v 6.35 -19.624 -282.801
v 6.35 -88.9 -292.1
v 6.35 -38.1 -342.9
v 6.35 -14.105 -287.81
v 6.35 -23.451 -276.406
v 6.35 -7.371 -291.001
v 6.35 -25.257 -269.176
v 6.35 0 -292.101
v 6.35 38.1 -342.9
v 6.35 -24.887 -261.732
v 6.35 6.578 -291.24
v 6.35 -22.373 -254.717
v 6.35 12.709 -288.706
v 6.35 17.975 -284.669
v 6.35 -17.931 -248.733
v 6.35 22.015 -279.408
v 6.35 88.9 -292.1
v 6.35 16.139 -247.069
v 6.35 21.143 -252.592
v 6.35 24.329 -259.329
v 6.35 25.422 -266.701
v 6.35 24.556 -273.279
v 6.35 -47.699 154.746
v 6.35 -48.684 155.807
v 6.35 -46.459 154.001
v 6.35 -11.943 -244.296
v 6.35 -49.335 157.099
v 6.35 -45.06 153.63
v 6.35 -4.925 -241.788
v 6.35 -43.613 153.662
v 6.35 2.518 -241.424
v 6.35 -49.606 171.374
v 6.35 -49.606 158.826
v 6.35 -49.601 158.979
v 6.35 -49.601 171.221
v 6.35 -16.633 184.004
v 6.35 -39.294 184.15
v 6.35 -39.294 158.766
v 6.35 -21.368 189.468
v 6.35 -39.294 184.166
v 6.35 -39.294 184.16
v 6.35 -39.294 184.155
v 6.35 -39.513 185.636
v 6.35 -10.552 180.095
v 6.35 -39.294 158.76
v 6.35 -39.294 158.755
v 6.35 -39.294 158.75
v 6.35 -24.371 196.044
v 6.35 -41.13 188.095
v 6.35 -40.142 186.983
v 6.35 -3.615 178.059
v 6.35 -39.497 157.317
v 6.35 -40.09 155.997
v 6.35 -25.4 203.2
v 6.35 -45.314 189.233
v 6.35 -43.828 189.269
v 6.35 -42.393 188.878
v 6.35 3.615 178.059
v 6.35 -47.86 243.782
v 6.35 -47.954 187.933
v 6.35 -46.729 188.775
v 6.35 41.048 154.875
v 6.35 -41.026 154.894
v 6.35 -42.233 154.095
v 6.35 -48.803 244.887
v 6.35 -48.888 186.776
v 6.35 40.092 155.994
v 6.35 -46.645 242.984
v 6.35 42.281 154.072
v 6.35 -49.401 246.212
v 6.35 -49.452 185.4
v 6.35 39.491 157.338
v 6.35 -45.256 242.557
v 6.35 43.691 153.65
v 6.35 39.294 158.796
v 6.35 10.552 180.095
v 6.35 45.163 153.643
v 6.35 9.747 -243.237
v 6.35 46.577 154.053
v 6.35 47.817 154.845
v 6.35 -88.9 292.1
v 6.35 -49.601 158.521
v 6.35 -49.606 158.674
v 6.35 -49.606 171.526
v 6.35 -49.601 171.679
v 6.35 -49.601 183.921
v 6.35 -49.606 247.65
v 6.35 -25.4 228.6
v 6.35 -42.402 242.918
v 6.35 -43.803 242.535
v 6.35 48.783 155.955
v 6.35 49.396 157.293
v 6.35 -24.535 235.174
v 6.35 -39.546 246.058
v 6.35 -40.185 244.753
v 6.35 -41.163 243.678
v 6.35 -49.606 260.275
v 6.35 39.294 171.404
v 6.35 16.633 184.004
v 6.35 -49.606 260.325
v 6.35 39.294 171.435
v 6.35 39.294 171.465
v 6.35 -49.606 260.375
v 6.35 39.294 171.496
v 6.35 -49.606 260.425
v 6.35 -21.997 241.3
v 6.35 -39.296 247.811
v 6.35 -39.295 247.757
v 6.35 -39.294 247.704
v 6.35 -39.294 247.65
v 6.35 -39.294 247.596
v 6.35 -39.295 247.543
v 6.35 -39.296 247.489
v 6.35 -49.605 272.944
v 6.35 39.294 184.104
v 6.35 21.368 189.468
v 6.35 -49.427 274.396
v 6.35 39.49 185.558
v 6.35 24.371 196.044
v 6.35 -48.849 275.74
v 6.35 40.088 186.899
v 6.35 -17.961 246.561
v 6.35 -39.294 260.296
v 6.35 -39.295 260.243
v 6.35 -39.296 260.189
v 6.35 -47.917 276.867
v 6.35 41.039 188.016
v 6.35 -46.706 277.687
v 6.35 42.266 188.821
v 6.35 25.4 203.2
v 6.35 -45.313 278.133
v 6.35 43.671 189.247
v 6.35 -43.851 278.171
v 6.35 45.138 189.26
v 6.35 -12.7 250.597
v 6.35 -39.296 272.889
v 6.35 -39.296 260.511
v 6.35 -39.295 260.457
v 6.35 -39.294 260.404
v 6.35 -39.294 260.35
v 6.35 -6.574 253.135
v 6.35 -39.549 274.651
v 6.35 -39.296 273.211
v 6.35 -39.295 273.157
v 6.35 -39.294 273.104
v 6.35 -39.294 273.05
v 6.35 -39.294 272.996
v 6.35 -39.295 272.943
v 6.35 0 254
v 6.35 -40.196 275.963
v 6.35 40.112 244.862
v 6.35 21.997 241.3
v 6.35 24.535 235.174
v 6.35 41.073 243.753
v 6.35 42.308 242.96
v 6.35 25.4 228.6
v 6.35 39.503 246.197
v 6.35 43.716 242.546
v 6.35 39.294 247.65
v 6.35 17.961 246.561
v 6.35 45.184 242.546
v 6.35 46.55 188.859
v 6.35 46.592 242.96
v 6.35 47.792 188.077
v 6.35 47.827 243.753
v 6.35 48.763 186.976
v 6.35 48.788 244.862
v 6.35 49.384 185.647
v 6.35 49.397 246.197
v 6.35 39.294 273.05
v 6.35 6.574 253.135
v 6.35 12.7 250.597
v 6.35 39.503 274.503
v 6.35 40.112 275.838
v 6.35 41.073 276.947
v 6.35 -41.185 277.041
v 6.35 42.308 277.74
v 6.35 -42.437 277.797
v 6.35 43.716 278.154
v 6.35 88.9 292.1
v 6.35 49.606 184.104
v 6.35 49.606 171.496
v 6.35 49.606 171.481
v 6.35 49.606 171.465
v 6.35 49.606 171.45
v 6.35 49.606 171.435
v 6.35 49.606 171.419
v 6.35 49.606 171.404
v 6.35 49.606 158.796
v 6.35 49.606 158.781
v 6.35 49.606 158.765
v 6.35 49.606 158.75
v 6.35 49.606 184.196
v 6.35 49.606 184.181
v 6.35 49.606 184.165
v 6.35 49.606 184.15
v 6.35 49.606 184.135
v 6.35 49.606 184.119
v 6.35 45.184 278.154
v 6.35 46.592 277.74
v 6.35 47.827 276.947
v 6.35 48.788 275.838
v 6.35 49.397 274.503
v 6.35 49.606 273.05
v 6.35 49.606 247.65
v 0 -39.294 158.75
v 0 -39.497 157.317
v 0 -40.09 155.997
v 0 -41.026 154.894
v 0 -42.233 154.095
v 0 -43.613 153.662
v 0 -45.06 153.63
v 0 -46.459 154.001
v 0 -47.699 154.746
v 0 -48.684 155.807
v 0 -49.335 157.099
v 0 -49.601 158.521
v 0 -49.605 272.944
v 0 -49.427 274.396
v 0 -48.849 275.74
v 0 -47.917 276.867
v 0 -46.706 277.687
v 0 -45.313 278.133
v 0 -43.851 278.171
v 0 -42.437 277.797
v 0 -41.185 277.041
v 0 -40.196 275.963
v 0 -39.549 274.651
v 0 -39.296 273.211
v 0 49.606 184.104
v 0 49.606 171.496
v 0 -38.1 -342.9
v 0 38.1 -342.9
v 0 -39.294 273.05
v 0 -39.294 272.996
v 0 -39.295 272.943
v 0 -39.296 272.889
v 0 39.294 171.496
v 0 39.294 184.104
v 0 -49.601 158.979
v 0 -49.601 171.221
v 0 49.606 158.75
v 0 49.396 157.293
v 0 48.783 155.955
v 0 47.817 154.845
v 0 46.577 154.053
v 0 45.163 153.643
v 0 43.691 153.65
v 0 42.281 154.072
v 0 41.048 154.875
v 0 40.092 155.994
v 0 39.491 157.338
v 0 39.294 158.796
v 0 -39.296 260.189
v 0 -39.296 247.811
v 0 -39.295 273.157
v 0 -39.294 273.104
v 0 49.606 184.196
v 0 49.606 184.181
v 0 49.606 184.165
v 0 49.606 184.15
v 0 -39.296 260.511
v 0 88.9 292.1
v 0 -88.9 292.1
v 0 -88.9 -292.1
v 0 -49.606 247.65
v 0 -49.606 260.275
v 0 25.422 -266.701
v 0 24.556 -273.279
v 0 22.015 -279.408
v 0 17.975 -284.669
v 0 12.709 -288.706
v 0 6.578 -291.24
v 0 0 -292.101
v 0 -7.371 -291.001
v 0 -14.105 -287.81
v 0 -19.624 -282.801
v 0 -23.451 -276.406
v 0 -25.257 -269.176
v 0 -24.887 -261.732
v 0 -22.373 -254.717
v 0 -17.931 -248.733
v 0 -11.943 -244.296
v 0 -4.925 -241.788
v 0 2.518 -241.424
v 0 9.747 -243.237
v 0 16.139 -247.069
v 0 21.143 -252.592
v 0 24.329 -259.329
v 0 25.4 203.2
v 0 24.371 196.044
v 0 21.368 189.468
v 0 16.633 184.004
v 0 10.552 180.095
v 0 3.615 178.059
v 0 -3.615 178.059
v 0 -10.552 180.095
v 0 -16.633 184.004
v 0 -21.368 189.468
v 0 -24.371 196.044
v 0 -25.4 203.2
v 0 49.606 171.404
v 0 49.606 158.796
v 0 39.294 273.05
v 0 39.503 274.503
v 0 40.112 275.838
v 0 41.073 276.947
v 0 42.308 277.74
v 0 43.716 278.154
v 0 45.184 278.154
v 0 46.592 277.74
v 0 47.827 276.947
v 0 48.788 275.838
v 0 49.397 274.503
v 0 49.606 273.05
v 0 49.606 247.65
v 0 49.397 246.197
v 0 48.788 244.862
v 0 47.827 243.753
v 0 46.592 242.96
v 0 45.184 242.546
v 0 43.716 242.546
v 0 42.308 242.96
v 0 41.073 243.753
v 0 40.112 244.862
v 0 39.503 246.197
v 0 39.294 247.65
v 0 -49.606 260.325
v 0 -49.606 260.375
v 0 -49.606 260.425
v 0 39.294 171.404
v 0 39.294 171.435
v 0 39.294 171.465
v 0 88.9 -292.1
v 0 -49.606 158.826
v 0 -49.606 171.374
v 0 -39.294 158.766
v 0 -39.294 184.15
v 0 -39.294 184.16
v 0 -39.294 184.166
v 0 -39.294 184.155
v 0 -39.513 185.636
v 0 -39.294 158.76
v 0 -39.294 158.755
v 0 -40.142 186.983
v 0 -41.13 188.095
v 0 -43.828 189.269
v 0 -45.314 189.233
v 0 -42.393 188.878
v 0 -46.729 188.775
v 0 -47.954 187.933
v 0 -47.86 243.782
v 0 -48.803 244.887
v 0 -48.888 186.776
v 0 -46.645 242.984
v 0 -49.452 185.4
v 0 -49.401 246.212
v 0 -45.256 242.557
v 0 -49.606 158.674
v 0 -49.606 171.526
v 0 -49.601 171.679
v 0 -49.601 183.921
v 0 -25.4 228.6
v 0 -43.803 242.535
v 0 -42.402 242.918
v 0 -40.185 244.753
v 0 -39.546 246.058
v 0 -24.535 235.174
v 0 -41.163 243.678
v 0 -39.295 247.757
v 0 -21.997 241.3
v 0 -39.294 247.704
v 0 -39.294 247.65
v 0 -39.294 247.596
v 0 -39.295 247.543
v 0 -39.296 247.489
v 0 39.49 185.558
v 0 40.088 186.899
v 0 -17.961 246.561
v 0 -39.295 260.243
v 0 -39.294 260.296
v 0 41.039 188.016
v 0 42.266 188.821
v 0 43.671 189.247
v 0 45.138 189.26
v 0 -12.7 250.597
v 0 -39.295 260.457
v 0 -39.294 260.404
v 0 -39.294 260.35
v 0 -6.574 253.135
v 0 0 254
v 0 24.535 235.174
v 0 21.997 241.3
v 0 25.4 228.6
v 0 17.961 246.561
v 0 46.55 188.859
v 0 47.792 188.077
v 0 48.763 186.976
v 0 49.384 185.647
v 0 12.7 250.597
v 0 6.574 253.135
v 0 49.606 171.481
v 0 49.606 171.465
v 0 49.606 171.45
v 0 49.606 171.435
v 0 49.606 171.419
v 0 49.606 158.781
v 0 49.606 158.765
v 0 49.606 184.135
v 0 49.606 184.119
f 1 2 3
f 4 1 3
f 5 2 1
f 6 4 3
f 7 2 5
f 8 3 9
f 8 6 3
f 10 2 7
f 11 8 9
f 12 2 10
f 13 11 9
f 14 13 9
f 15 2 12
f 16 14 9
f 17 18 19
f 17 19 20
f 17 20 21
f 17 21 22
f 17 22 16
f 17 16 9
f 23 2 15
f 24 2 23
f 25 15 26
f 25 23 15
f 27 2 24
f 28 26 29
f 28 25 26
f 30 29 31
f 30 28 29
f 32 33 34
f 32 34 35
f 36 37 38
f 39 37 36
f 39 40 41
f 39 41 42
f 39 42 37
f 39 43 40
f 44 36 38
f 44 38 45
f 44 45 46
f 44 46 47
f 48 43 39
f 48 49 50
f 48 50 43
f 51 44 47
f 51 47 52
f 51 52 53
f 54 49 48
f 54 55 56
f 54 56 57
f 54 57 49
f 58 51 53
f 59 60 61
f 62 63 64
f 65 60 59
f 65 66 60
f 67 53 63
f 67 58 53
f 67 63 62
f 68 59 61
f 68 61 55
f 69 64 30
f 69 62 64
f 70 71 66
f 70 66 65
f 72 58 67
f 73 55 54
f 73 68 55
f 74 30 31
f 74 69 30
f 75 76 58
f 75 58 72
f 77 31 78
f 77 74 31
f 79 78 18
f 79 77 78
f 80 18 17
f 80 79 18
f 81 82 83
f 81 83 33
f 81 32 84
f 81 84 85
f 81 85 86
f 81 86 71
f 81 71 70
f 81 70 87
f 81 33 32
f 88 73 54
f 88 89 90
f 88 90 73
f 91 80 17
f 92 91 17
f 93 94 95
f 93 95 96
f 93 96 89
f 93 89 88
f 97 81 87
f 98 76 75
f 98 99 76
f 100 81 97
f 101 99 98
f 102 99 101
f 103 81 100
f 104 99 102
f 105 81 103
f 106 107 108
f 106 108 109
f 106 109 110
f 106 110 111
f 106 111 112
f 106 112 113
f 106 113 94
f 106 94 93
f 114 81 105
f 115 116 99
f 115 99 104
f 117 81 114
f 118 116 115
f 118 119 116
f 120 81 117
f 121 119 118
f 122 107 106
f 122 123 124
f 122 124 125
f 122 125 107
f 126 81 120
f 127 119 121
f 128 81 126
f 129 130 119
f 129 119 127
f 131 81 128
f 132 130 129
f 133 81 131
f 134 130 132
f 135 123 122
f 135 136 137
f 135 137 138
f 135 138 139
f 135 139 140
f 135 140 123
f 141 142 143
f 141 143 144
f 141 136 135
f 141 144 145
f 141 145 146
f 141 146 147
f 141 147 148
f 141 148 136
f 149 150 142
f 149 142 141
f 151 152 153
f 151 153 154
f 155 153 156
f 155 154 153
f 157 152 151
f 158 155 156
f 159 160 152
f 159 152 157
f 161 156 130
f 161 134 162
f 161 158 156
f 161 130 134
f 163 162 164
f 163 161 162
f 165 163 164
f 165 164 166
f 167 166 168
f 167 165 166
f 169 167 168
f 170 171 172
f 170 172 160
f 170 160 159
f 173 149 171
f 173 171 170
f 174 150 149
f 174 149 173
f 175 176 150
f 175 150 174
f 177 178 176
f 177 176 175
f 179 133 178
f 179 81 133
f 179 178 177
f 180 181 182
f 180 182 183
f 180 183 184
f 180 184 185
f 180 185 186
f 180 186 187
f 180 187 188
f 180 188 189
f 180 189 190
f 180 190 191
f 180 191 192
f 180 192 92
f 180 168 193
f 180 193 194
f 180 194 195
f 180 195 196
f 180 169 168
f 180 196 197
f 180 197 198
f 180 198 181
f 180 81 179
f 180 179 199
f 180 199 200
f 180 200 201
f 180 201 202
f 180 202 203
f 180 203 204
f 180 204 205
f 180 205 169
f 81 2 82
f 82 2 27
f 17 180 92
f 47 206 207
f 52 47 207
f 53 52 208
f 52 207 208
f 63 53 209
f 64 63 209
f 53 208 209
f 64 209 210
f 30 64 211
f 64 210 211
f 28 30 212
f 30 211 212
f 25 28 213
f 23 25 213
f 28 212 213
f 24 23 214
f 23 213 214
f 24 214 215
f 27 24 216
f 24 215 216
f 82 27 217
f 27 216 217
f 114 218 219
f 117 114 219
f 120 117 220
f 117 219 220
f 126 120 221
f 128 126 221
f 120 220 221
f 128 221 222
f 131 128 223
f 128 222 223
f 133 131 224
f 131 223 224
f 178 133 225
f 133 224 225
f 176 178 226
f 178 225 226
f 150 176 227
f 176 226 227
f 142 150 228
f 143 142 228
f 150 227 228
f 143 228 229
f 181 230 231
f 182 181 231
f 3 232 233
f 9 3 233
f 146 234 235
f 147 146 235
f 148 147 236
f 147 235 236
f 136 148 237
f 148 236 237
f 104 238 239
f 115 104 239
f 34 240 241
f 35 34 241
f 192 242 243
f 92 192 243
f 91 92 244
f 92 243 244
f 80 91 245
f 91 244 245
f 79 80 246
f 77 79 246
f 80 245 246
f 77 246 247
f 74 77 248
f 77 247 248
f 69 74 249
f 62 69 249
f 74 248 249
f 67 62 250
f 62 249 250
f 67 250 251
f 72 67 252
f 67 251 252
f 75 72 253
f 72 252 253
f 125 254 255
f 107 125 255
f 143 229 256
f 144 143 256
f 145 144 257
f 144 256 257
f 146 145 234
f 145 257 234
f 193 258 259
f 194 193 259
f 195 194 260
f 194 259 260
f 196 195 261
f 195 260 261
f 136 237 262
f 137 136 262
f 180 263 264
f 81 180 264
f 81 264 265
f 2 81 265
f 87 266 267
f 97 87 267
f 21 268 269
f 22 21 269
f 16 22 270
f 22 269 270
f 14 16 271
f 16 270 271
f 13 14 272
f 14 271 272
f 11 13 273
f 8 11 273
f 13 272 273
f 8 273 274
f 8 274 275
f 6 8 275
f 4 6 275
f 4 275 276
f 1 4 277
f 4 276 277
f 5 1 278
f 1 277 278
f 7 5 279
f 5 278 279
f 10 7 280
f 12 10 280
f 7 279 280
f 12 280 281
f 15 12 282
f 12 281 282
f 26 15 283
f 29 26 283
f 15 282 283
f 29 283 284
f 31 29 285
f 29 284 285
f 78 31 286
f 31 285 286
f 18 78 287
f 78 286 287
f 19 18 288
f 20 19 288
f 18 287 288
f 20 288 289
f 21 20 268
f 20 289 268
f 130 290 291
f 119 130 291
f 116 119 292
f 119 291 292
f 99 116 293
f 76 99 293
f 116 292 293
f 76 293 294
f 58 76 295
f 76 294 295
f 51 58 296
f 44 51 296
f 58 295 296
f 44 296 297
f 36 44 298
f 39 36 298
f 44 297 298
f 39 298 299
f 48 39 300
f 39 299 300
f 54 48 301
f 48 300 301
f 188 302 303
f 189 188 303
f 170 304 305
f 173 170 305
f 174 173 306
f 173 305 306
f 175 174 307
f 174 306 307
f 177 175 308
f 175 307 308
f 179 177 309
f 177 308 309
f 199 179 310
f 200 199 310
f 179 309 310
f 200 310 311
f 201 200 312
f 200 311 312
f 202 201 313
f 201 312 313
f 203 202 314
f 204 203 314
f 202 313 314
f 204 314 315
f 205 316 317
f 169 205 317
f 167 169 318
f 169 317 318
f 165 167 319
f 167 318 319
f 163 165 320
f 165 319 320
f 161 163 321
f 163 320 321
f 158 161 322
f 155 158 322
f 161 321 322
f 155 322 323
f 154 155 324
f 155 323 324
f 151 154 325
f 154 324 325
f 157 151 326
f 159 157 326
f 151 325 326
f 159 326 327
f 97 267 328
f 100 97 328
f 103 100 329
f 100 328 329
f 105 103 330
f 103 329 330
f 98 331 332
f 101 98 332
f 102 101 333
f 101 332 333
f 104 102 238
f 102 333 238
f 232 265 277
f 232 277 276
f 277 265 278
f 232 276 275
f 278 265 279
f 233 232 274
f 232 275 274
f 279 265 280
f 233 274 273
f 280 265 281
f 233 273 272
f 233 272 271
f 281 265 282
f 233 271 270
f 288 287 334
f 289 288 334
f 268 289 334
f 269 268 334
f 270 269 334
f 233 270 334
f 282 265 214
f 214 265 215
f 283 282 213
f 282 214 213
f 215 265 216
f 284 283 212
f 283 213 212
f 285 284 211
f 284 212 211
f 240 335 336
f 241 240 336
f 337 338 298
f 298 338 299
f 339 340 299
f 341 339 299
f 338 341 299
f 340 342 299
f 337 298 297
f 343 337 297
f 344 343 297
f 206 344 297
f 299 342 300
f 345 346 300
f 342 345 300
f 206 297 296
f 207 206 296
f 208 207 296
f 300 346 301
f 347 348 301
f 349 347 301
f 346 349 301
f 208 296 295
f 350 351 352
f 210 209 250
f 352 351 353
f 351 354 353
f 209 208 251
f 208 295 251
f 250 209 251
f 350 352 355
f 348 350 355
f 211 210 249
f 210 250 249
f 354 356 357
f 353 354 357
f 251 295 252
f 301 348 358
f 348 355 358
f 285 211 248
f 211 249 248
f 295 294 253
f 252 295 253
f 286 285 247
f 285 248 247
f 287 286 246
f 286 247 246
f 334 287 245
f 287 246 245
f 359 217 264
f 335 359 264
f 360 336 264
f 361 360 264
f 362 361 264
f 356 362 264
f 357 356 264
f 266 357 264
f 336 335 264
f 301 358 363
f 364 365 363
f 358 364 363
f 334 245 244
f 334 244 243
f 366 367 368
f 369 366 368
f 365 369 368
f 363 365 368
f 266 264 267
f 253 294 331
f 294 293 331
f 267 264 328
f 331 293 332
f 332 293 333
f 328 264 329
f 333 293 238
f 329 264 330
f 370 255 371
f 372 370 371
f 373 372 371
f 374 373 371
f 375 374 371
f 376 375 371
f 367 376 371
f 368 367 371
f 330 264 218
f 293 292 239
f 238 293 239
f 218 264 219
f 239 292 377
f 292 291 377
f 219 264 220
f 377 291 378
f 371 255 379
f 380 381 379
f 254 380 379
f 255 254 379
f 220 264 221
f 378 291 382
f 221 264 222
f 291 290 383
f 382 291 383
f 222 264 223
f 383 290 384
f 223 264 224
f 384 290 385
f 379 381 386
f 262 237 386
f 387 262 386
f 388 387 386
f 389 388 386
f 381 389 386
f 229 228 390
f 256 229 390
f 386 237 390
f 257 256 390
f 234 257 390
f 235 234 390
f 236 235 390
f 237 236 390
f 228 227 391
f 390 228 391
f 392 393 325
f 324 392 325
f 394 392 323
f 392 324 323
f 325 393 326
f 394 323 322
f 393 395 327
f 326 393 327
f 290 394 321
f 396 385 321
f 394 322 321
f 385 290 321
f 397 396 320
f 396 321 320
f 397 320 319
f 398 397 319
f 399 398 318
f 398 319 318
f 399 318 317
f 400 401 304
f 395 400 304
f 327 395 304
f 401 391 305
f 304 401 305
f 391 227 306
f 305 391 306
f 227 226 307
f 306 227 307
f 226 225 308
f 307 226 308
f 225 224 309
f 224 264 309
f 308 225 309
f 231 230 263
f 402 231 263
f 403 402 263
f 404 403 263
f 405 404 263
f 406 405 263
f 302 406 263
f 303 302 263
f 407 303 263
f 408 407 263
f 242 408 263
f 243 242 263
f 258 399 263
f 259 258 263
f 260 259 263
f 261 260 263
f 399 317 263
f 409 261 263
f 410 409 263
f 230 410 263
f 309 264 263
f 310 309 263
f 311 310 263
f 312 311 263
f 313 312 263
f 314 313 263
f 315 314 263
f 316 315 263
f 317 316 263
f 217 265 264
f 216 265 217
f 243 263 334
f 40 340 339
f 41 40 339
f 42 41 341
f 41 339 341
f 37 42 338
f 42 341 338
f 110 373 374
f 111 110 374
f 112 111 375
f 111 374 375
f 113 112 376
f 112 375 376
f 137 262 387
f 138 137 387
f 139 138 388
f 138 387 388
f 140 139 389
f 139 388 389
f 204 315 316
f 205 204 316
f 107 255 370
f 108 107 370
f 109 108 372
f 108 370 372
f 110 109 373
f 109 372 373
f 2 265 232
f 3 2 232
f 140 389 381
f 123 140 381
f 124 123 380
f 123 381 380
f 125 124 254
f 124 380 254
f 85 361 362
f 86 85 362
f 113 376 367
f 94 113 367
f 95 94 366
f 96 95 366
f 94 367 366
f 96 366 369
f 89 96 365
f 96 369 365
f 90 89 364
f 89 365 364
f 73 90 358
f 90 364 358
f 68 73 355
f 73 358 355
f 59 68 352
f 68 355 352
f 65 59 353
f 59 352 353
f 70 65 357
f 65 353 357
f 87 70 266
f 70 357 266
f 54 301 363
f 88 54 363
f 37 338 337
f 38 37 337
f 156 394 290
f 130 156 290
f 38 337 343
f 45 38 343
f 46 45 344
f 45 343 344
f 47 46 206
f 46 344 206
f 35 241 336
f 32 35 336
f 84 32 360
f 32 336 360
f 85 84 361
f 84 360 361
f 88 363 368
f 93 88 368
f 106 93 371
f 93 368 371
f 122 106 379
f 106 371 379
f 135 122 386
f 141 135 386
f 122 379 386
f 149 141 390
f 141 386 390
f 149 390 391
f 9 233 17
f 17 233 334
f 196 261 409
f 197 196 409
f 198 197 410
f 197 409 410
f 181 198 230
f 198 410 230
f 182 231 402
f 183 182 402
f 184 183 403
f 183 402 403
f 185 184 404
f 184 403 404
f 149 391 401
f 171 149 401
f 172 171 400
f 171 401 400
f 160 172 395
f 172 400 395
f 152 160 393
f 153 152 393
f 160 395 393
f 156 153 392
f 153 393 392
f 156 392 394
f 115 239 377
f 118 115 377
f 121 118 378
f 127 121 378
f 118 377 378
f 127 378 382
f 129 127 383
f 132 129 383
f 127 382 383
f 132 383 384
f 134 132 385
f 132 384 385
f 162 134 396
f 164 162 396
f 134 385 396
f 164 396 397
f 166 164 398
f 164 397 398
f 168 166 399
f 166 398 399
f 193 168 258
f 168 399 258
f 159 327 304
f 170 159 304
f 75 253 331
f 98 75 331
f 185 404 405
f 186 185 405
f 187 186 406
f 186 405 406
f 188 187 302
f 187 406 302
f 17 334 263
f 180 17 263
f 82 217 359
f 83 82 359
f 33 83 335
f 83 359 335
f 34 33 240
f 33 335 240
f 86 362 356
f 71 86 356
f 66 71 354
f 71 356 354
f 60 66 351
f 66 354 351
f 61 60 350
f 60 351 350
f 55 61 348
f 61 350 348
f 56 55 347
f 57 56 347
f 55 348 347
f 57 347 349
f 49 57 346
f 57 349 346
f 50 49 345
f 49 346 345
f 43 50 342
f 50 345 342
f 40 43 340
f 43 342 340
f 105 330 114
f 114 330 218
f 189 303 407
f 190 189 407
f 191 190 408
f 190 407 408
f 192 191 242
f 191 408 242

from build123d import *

# Parameters (mm, degrees)
F1_DEPTH = 6.35


# Not quite as in the source:
# - ends of sketch curves that miss each other by under 0.0002 mm in the source are joined


with BuildPart() as f1:
    # F0 (on Right) → F1 (new body)
    with BuildSketch(Plane.YZ):
        Polygon((0, 292.1), (-88.9, 292.1), (-88.9, -292.1), (-38.1, -342.9), (0, -342.9), (38.1, -342.9), (88.9, -292.1), (88.9, 292.1), align=None)
        with BuildLine():
            ThreePointArc((25.4220090151, -266.7011916637), (17.974738209, -284.6694835829), (0, -292.1011821284))
            ThreePointArc((0, -292.1011821284), (-17.9307201788, -248.7328997446), (25.4220090151, -266.7011916637))
        make_face(mode=Mode.SUBTRACT)
        with BuildLine():
            Line((-39.2938236907, 184.15), (-39.2938236907, 171.45))
            Line((-39.2938236907, 171.45), (-39.2938236907, 158.7656303343))
            ThreePointArc((-39.2938236907, 158.7656303343), (-39.2938059227, 158.7578151761), (-39.2938, 158.75))
            ThreePointArc((-39.2938, 158.75), (-44.3355371946, 153.59507064), (-49.6011180661, 158.5211308033))
            ThreePointArc((-49.6011180661, 158.5211308033), (-49.6062, 158.75), (-49.6011180661, 158.9788691967))
            Line((-49.6011180661, 158.9788691967), (-49.6011180661, 171.2211308033))
            ThreePointArc((-49.6011180661, 171.2211308033), (-49.6062, 171.45), (-49.6011180661, 171.6788691967))
            Line((-49.6011180661, 171.6788691967), (-49.6011180661, 183.9211308033))
            ThreePointArc((-49.6011180661, 183.9211308033), (-44.5722759242, 189.3047499492), (-39.2938236907, 184.1656303343))
            ThreePointArc((-39.2938236907, 184.1656303343), (-39.2938059227, 184.1578151761), (-39.2938236907, 184.15))
        make_face(mode=Mode.SUBTRACT)
        with BuildLine():
            ThreePointArc((-39.2963037105, 260.5106642339), (-39.2944259656, 260.4303418705), (-39.2938, 260.35))
            ThreePointArc((-39.2938, 260.35), (-39.2944259656, 260.2696581295), (-39.2963037105, 260.1893357661))
            Line((-39.2963037105, 260.1893357661), (-39.2963037105, 247.8106642339))
            ThreePointArc((-39.2963037105, 247.8106642339), (-39.2944259656, 247.7303418705), (-39.2938, 247.65))
            ThreePointArc((-39.2938, 247.65), (-39.2944259656, 247.5696581295), (-39.2963037105, 247.4893357661))
            ThreePointArc((-39.2963037105, 247.4893357661), (-44.5304520833, 242.4944276843), (-49.6061999953, 247.6502204525))
            Line((-49.6061999953, 247.6502204525), (-49.6056602081, 260.2753926376))
            ThreePointArc((-49.6056602081, 260.2753926376), (-49.6061999953, 260.3502204525), (-49.6056538096, 260.4250482209))
            Line((-49.6056538096, 260.4250482209), (-49.6051185467, 272.9444007144))
            ThreePointArc((-49.6051185467, 272.9444007144), (-44.583133659, 278.2044809505), (-39.2963037105, 273.2106642339))
            ThreePointArc((-39.2963037105, 273.2106642339), (-39.2944259656, 273.1303418705), (-39.2938, 273.05))
            ThreePointArc((-39.2938, 273.05), (-39.2944259656, 272.9696581295), (-39.2963037105, 272.8893357661))
            Line((-39.2963037105, 272.8893357661), (-39.2963037105, 260.5106642339))
        make_face(mode=Mode.SUBTRACT)
        with BuildLine():
            ThreePointArc((-25.4, 228.6), (-17.9605122421, 246.5605122421), (0, 254))
            ThreePointArc((0, 254), (17.9605122421, 246.5605122421), (25.4, 228.6))
            Line((25.4, 228.6), (25.4, 203.2))
            ThreePointArc((25.4, 203.2), (0, 177.8), (-25.4, 203.2))
            Line((-25.4, 203.2), (-25.4, 228.6))
        make_face(mode=Mode.SUBTRACT)
        with BuildLine():
            ThreePointArc((49.6059938769, 171.496104026), (49.606148469, 171.4730522434), (49.6062, 171.45))
            ThreePointArc((49.6062, 171.45), (49.606148469, 171.4269477566), (49.6059938769, 171.403895974))
            Line((49.6059938769, 171.403895974), (49.6059938769, 158.796104026))
            ThreePointArc((49.6059938769, 158.796104026), (49.606148469, 158.7730522434), (49.6062, 158.75))
            ThreePointArc((49.6062, 158.75), (44.4268978801, 153.5938517543), (39.294007016, 158.7962037759))
            Line((39.294007016, 158.7962037759), (39.294007016, 171.4037962241))
            ThreePointArc((39.294007016, 171.4037962241), (39.2938, 171.45), (39.294007016, 171.4962037759))
            Line((39.294007016, 171.4962037759), (39.294007016, 184.1037962241))
            ThreePointArc((39.294007016, 184.1037962241), (44.403846099, 189.3059934307), (49.6059938769, 184.196104026))
            ThreePointArc((49.6059938769, 184.196104026), (49.606148469, 184.1730522434), (49.6062, 184.15))
            ThreePointArc((49.6062, 184.15), (49.606148469, 184.1269477566), (49.6059938769, 184.103895974))
            Line((49.6059938769, 184.103895974), (49.6059938769, 171.496104026))
        make_face(mode=Mode.SUBTRACT)
        with BuildLine():
            ThreePointArc((39.2938, 273.05), (44.45, 278.2062), (49.6062, 273.05))
            Line((49.6062, 273.05), (49.6062, 260.35))
            Line((49.6062, 260.35), (49.6062, 247.65))
            ThreePointArc((49.6062, 247.65), (44.45, 242.4938), (39.2938, 247.65))
            Line((39.2938, 247.65), (39.2938, 260.35))
            Line((39.2938, 260.35), (39.2938, 273.05))
        make_face(mode=Mode.SUBTRACT)
    extrude(amount=F1_DEPTH)


solid = f1.part
